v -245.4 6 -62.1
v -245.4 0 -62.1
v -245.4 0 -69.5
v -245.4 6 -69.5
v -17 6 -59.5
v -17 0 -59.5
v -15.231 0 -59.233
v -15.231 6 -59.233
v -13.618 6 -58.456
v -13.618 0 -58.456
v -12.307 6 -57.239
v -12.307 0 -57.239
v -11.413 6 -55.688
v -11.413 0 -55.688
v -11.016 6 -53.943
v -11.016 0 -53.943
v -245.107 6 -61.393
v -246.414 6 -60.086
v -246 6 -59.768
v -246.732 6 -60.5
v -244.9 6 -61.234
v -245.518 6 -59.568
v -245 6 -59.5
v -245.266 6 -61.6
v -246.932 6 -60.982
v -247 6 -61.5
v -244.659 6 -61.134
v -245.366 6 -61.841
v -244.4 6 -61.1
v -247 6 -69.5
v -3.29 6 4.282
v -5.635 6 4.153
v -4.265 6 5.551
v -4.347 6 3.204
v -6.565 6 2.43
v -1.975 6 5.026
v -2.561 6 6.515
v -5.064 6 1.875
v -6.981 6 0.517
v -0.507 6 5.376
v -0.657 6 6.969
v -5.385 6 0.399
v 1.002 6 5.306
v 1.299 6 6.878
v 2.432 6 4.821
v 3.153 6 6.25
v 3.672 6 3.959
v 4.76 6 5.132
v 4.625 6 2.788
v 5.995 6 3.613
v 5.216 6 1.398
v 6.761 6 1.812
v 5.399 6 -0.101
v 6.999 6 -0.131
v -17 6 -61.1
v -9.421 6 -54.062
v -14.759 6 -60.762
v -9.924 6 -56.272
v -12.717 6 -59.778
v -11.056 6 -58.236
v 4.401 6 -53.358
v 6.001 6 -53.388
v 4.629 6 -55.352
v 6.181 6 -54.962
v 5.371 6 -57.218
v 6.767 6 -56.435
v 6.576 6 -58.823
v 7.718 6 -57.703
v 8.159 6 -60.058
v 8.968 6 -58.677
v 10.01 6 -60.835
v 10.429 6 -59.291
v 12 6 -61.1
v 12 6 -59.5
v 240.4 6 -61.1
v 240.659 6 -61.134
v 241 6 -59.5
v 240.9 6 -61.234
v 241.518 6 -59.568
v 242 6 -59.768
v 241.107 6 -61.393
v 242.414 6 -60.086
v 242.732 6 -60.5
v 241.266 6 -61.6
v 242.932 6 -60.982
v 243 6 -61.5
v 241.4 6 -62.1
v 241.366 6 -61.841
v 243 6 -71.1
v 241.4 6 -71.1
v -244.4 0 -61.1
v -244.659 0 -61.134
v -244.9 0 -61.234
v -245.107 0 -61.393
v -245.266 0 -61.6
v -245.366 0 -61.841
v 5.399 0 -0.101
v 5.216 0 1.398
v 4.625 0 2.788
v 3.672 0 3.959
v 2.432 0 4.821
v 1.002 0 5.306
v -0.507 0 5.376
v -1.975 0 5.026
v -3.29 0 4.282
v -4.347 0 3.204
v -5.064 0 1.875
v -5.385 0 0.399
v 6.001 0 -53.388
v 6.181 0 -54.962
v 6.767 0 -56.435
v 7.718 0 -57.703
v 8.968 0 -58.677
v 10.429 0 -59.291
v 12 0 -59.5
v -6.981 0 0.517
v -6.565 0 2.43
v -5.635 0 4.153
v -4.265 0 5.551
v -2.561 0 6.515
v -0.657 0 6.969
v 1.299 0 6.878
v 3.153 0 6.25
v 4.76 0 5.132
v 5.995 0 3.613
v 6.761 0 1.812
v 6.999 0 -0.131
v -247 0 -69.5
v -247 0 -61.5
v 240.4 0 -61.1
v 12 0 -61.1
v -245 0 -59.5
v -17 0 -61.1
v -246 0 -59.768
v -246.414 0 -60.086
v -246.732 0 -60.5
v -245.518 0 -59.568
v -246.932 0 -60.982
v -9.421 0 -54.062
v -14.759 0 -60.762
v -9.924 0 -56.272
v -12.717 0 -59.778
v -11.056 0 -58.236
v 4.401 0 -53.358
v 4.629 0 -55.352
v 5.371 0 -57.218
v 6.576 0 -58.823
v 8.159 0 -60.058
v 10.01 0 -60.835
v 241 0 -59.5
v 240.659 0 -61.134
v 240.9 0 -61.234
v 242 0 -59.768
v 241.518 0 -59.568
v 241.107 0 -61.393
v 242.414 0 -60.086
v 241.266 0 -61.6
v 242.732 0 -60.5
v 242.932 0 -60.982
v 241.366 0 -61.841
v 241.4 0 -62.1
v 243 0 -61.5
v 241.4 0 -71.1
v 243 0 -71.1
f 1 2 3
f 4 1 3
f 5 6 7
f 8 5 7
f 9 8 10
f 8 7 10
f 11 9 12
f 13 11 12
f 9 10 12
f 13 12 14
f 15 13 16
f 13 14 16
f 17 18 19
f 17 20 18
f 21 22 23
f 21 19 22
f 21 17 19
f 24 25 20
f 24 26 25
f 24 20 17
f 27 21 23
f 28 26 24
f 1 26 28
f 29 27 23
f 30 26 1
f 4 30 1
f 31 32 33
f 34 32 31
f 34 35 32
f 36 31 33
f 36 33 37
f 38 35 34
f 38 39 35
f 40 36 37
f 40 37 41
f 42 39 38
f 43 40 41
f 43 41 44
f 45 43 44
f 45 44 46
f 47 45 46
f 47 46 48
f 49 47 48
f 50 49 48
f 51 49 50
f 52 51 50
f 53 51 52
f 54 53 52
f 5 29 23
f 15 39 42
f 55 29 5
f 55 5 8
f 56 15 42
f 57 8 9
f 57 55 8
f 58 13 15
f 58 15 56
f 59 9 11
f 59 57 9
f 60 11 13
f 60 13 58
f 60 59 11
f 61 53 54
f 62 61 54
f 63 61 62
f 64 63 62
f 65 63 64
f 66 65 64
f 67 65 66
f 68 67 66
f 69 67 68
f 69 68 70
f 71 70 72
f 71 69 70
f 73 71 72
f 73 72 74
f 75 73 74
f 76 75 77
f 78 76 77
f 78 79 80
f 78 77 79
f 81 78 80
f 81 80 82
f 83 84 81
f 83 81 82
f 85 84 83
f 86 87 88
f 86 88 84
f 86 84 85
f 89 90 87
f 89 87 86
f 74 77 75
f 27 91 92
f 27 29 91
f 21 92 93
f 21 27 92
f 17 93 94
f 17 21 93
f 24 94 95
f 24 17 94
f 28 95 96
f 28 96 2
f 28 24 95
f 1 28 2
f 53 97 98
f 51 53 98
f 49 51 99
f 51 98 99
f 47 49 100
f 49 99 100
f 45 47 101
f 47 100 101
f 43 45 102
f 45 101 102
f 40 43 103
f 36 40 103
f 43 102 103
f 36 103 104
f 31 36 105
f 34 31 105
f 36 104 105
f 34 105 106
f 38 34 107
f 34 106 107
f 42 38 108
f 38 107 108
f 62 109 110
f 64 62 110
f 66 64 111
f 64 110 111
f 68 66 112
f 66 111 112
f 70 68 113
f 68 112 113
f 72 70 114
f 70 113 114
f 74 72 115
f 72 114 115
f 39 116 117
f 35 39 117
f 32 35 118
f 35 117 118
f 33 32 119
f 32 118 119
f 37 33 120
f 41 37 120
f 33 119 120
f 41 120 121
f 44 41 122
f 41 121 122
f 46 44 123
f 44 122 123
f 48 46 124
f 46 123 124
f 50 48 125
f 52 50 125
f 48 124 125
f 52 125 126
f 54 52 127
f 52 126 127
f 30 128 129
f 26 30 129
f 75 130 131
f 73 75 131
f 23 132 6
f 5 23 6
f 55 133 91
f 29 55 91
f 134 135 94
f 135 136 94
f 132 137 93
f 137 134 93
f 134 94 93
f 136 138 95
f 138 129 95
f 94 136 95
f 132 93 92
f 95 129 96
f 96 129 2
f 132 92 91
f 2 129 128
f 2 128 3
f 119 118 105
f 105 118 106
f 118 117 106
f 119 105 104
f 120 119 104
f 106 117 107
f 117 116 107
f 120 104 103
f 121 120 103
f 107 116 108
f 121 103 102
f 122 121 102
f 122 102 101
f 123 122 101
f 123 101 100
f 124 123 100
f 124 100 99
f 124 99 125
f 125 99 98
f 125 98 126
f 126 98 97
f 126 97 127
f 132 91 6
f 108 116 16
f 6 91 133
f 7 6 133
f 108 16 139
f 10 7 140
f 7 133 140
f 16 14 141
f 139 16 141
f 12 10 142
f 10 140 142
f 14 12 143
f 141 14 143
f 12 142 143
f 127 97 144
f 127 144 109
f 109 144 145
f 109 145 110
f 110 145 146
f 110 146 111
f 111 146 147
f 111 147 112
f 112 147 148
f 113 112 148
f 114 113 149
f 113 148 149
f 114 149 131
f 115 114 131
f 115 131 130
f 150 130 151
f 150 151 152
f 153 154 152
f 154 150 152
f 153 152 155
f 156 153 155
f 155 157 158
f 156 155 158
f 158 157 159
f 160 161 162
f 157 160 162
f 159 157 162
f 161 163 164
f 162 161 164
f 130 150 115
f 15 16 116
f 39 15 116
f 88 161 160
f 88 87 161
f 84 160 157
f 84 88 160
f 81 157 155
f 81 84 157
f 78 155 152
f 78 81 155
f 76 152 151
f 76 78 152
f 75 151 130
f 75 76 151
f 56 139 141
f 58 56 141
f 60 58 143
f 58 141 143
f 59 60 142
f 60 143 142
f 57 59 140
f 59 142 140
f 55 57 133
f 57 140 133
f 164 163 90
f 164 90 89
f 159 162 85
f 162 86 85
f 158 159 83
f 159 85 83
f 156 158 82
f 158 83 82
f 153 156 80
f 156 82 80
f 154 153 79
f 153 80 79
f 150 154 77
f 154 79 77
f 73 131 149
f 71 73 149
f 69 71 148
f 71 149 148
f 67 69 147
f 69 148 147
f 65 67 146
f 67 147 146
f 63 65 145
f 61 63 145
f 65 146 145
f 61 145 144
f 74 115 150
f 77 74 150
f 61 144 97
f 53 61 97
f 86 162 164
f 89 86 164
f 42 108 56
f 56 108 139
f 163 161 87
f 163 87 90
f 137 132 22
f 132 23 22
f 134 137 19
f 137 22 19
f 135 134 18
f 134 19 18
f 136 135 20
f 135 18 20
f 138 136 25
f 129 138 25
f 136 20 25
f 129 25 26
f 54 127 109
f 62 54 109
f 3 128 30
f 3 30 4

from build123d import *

# Parameters (mm, degrees)
SKETCH1_W           = 1.6
SKETCH1_H           = 8.4
SKETCH1_H_2         = 1.6
SKETCH1_H_3         = 10
BOSS_EXTRUDE1_DEPTH = 6
FILLET1_R           = 1
FILLET2_R           = 2


with BuildPart() as part:
    # Sketch1 → Boss-Extrude1 (new body)
    with BuildSketch(Plane(origin=(0, 0, 0), x_dir=(1, 0, 0), z_dir=(0, 1, 0))):
        with Locations((-246.2, 65.3)):
            Rectangle(SKETCH1_W, SKETCH1_H)
        with Locations((-246.2, 60.3)):
            Rectangle(SKETCH1_W, SKETCH1_H_2)
        with BuildLine():
            Line((-245.4, 59.5), (-17, 59.5))
            ThreePointArc((-17, 59.5), (-12.917127972, 57.896607329), (-11.016404973, 53.943385336))
            Line((-11.016404973, 53.943385336), (-6.980860865, -0.517282892))
            ThreePointArc((-6.980860865, -0.517282892), (0.324323403, -6.992482701), (6.998771924, 0.131116578))
            Line((6.998771924, 0.131116578), (6.001052637, 53.387614362))
            ThreePointArc((6.001052637, 53.387614362), (7.717809332, 57.702718535), (12, 59.5))
            Line((12, 59.5), (241.4, 59.5))
            Line((241.4, 59.5), (241.4, 61.1))
            Line((241.4, 61.1), (12, 61.1))
            ThreePointArc((12, 61.1), (6.575891821, 58.823443478), (4.40133334, 53.357644858))
            Line((4.40133334, 53.357644858), (5.399052627, 0.101147074))
            ThreePointArc((5.399052627, 0.101147074), (0.250192339, -5.394200941), (-5.385235524, -0.399046802))
            Line((-5.385235524, -0.399046802), (-9.420779633, 54.061621425))
            ThreePointArc((-9.420779633, 54.061621425), (-11.828362098, 59.06903595), (-17, 61.1))
            Line((-17, 61.1), (-245.4, 61.1))
            Line((-245.4, 61.1), (-245.4, 59.5))
        make_face()
        with Locations((242.2, 60.3)):
            Rectangle(SKETCH1_W, SKETCH1_H_2)
        with Locations((242.2, 66.1)):
            Rectangle(SKETCH1_W, SKETCH1_H_3)
    extrude(amount=BOSS_EXTRUDE1_DEPTH)

    # Fillet1
    fillet1_edges = [part.edges().sort_by_distance(p)[0] for p in [
        (-245.4, 3, -61.1),
        (241.4, 3, -61.1),
    ]]
    fillet(fillet1_edges, radius=FILLET1_R)

    # Fillet2
    fillet2_edges = [part.edges().sort_by_distance(p)[0] for p in [
        (243, 3, -59.5),
        (-247, 3, -59.5),
    ]]
    fillet(fillet2_edges, radius=FILLET2_R)


solid = part.part
